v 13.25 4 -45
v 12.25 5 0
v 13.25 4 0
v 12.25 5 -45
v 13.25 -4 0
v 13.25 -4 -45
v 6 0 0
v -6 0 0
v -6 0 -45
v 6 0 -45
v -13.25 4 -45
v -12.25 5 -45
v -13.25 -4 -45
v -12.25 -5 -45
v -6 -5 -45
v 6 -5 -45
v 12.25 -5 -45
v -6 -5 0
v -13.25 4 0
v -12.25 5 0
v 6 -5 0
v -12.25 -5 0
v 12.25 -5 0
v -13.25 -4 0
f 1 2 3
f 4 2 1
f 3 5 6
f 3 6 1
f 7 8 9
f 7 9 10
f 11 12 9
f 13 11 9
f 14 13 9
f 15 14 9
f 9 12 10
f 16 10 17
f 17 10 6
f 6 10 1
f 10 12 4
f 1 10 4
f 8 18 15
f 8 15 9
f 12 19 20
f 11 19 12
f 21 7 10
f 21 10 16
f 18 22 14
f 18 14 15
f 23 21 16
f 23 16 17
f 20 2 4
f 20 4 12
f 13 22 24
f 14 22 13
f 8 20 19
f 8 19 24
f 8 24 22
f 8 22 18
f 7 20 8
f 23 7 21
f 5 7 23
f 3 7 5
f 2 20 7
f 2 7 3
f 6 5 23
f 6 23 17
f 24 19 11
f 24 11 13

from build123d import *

# Parameters (mm, degrees)
BOSS_EXTRUDE1_DEPTH = 45
CHAMFER1_SIZE       = 1


with BuildPart() as part:
    # Sketch1 → Boss-Extrude1 (new body)
    with BuildSketch(Plane.XY):
        Polygon((6, -5), (13.25, -5), (13.25, 5), (-13.25, 5), (-13.25, -5), (-6, -5), (-6, 0), (6, 0), align=None)
    extrude(amount=-BOSS_EXTRUDE1_DEPTH)

    # Chamfer1
    chamfer1_edges = [part.edges().sort_by_distance(p)[0] for p in [
        (-13.25, -5, -22.5),
        (-13.25, 5, -22.5),
        (13.25, 5, -22.5),
        (13.25, -5, -22.5),
    ]]
    chamfer(chamfer1_edges, length=CHAMFER1_SIZE)


solid = part.part
